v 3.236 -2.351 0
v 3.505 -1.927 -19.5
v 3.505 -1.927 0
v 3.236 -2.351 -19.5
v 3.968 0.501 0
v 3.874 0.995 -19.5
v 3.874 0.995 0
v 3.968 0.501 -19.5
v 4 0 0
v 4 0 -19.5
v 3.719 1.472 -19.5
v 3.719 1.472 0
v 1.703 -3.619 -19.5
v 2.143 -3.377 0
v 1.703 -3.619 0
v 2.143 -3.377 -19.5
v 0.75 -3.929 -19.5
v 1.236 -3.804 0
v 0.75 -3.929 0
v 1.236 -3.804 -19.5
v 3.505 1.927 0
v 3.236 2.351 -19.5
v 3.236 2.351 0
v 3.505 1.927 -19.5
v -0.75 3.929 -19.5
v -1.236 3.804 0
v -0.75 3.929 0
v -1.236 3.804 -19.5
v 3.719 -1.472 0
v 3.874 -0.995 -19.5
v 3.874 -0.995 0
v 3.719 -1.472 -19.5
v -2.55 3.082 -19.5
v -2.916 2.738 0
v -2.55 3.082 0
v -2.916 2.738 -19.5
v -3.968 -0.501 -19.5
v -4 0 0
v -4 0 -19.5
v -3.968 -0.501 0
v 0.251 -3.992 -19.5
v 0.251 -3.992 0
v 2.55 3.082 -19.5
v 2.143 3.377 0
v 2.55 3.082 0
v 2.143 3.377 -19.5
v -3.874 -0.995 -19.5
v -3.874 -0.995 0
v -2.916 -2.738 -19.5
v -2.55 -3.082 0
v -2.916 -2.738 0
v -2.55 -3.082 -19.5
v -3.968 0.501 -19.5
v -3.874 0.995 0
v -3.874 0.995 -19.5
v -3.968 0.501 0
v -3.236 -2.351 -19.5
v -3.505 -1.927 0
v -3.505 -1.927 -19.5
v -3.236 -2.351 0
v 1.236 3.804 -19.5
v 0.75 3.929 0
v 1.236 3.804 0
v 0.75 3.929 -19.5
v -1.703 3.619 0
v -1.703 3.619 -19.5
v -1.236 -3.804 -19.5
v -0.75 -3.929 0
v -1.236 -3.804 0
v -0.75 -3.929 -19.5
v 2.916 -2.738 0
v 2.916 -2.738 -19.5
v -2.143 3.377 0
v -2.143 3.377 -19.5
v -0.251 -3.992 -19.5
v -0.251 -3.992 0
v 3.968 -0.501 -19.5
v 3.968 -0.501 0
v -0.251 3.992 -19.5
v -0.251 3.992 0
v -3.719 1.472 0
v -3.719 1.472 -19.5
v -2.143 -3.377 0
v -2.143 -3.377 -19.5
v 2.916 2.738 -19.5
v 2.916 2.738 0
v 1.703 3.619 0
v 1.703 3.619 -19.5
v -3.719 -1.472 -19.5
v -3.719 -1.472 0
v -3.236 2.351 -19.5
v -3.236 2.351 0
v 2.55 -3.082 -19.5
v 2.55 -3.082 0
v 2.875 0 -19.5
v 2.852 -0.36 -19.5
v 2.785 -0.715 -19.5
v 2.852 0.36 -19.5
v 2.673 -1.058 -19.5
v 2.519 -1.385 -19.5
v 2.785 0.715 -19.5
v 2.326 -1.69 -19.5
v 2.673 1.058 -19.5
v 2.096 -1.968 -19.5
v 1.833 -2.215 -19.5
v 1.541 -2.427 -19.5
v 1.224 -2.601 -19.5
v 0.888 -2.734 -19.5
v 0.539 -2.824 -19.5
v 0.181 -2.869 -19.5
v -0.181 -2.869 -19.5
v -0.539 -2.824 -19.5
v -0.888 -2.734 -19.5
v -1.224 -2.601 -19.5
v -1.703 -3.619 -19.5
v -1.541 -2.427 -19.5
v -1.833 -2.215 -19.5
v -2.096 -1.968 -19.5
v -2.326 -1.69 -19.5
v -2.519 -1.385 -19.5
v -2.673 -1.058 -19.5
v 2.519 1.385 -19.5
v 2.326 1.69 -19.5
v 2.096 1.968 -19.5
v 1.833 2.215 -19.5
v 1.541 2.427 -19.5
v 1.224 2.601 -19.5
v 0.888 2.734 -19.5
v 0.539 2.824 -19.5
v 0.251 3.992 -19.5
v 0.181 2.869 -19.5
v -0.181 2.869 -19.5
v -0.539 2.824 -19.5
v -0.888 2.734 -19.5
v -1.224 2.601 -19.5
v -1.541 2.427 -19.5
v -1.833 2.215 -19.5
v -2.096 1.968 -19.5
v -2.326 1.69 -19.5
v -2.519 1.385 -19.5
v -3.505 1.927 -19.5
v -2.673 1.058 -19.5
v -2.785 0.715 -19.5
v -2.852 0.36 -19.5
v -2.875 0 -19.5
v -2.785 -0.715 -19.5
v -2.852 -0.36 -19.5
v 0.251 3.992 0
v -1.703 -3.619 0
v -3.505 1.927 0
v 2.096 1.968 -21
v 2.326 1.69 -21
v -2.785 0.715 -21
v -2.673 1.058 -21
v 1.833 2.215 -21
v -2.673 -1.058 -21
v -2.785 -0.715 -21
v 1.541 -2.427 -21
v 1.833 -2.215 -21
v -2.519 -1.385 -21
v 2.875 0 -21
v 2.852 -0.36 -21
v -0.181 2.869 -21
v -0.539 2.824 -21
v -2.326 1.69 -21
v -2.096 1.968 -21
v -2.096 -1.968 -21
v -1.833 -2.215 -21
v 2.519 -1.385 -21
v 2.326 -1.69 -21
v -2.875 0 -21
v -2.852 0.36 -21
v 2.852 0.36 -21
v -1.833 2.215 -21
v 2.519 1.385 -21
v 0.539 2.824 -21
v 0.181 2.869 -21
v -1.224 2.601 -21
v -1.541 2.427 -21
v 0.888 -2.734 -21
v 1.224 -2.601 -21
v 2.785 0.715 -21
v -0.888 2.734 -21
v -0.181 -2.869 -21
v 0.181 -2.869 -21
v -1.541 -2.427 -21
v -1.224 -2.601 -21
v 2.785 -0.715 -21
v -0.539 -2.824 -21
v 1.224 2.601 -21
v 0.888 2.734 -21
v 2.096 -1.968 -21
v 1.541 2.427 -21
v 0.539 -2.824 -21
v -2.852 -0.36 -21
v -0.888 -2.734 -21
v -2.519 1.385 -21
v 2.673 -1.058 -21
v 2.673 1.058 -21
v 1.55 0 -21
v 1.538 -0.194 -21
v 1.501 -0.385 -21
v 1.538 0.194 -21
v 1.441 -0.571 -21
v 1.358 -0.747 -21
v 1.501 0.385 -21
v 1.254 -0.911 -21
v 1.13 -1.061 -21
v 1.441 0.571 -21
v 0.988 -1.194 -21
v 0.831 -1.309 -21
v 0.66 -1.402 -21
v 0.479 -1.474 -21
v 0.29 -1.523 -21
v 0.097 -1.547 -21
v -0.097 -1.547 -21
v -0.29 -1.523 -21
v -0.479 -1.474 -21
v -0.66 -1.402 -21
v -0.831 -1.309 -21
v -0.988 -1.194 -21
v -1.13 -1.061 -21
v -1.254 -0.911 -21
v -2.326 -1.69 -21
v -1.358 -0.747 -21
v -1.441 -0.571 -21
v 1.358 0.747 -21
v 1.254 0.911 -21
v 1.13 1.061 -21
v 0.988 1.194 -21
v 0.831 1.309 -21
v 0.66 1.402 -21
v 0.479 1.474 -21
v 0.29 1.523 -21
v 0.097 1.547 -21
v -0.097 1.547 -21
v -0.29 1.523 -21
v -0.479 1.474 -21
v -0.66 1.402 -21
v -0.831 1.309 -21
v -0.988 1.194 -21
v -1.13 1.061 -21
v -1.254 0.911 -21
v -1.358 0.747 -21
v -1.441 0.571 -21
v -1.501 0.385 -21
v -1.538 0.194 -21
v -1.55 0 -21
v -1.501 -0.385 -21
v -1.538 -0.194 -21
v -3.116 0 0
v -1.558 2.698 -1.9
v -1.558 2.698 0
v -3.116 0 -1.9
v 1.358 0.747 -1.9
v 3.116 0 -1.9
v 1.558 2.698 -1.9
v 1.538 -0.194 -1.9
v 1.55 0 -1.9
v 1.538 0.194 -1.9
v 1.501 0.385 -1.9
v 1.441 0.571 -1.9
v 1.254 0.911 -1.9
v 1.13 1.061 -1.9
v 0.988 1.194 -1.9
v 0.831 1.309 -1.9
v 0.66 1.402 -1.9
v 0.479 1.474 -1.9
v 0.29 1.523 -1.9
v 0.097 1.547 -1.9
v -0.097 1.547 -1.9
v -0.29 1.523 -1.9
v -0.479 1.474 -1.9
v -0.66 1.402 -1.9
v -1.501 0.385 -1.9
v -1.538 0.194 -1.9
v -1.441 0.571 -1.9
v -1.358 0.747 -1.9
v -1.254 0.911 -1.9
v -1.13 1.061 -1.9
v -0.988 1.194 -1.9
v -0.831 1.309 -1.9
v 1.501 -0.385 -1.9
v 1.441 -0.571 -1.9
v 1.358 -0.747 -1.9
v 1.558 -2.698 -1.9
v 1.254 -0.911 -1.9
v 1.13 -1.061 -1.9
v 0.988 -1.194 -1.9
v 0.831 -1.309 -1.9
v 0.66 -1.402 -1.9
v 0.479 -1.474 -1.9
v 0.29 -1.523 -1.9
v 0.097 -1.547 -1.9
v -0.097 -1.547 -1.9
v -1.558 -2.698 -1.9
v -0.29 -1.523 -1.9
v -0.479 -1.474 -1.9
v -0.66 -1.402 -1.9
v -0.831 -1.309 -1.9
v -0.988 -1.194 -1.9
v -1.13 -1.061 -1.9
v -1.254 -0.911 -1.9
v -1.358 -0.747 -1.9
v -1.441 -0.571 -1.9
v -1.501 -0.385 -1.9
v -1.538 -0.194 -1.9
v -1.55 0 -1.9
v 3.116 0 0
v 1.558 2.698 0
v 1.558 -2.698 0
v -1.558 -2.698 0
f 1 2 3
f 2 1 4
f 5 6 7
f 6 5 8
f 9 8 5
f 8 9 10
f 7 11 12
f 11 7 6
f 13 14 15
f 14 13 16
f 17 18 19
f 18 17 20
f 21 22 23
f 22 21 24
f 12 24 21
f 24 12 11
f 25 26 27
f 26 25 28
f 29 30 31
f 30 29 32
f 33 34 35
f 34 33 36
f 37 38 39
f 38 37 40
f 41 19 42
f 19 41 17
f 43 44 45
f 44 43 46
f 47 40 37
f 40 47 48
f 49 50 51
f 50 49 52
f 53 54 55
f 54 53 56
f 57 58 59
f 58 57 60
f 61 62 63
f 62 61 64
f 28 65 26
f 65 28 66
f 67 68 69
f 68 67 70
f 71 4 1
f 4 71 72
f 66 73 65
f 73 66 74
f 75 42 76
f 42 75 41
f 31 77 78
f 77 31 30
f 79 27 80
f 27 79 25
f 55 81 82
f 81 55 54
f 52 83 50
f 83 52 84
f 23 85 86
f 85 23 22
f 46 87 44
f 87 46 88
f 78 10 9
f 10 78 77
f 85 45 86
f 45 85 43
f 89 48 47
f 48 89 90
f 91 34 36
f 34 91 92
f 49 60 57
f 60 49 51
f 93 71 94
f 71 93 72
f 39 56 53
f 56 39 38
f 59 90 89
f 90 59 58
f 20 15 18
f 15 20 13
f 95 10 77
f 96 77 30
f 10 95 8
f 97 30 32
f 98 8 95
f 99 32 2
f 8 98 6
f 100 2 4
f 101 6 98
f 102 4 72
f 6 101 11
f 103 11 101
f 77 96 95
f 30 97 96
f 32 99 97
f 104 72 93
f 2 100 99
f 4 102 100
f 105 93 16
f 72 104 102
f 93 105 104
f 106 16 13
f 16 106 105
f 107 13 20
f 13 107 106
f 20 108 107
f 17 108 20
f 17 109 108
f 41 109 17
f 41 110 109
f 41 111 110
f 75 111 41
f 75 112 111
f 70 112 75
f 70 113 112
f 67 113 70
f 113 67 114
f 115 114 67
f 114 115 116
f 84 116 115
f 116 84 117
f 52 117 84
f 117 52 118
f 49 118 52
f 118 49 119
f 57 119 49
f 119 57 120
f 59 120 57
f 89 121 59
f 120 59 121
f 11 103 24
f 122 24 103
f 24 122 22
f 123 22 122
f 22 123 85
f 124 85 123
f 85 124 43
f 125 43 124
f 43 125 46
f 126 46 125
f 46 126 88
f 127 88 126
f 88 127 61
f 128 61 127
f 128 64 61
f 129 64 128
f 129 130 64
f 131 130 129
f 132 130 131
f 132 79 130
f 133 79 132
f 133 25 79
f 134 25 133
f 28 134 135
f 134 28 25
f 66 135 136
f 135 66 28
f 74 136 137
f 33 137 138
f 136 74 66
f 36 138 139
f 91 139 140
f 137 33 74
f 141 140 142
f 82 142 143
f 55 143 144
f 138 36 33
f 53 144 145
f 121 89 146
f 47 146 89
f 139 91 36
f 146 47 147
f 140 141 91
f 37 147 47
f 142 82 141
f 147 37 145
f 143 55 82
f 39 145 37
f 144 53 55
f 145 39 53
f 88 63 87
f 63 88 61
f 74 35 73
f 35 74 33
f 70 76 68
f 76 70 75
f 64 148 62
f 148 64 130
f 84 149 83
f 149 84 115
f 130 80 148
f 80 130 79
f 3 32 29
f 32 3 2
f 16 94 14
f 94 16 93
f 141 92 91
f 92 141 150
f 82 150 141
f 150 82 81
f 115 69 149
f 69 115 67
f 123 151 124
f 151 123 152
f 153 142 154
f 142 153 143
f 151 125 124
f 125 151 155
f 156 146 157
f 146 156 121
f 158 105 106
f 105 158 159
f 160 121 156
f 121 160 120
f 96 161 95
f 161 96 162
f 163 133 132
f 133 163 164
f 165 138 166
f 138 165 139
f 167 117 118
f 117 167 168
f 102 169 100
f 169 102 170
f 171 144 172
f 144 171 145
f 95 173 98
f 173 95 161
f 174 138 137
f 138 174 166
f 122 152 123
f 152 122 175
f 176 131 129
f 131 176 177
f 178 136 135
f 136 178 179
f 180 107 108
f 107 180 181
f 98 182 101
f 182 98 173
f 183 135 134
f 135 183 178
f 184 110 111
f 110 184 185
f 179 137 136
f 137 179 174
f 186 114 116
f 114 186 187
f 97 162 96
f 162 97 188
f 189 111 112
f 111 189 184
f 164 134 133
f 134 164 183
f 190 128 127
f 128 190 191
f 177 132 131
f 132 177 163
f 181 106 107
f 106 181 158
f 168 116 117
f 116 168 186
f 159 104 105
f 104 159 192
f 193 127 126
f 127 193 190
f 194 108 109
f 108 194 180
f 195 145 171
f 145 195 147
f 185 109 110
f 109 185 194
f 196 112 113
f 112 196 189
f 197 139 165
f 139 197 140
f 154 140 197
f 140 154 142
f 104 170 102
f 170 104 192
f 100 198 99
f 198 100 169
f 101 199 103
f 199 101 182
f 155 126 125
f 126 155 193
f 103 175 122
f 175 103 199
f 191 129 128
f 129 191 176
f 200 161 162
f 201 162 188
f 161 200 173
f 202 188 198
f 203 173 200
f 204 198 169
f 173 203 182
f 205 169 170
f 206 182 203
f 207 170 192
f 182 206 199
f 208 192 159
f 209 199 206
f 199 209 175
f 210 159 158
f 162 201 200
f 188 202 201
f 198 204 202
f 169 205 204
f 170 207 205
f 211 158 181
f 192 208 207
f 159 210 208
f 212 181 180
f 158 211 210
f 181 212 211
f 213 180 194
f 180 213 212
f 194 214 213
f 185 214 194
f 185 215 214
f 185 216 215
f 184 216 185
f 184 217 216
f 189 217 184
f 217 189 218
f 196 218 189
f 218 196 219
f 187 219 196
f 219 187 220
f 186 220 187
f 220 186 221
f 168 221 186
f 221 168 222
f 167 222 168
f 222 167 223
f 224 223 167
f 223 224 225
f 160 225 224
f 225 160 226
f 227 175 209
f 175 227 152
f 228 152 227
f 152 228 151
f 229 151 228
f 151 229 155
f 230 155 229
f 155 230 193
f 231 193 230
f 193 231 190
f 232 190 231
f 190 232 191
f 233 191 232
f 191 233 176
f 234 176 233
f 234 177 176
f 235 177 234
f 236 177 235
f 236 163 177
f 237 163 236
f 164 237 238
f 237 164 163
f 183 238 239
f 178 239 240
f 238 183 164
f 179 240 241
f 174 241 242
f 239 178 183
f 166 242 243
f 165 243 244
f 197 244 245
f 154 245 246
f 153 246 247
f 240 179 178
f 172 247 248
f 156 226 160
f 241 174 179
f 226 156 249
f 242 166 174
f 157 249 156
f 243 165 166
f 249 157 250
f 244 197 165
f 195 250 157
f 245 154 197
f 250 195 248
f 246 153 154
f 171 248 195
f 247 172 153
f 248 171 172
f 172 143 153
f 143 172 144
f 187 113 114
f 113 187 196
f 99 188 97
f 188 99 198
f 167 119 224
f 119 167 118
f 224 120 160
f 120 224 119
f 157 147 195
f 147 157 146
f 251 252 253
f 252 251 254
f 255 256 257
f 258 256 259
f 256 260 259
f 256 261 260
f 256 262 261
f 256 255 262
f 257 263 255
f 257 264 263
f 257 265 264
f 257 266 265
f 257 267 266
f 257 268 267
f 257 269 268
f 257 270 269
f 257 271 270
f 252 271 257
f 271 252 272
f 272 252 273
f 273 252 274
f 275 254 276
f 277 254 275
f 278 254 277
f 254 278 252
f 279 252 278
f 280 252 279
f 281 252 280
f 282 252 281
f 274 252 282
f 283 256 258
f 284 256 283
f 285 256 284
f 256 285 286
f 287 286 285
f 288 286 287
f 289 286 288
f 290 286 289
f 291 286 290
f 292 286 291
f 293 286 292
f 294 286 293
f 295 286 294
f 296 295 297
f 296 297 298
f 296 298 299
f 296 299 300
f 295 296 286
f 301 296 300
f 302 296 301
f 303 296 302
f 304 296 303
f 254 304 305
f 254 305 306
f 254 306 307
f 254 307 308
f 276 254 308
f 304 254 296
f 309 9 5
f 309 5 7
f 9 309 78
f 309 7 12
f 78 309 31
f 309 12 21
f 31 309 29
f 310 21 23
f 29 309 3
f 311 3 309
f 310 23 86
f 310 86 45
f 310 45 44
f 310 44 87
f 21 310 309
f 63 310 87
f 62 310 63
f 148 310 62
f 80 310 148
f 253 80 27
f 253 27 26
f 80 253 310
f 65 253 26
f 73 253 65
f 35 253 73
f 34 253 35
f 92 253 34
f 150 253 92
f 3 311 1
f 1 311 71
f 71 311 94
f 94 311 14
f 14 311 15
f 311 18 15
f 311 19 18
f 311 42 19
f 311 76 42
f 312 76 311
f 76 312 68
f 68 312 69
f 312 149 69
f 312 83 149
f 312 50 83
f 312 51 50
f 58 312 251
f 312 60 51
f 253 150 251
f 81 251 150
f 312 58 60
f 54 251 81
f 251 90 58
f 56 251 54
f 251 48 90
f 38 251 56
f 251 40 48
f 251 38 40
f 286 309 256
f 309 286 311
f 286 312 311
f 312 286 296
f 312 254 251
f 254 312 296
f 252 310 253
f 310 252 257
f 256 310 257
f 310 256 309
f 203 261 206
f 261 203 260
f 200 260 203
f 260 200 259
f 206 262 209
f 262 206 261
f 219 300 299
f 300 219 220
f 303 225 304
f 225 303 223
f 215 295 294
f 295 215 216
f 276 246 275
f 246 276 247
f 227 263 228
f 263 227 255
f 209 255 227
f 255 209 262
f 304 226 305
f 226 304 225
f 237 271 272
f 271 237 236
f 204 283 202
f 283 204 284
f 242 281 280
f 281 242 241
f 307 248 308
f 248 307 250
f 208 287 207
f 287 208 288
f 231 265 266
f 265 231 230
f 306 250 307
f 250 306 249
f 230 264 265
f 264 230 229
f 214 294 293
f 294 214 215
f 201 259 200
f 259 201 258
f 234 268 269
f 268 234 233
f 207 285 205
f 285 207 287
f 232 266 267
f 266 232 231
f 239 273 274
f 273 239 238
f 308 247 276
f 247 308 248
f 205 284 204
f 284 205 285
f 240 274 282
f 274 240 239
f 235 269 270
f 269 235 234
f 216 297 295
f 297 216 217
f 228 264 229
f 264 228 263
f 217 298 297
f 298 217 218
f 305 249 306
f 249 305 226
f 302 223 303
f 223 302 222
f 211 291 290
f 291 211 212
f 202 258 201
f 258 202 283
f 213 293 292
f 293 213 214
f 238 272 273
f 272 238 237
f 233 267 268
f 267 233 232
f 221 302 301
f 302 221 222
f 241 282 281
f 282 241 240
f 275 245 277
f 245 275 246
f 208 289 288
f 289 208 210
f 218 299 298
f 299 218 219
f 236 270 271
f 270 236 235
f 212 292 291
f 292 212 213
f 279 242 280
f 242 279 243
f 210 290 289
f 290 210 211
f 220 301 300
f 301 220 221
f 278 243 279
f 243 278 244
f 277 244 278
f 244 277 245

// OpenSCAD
$fn = 50;

difference() {
	union() {
		translate(v = [0, 0, -19.5]) {
			cylinder(h = 22.5, r = 4.0);
		}
		#translate(v = [0, 0, -21.0]) {
			cylinder(h = 21, r = 2.875);
		}
	}
	union() {
		translate(v = [0, 0, 0]) {
			rotate(a = [0, 0, 0]) {
				difference() {
					union() {
						translate(v = [0, 0, -1.9]) {
							linear_extrude(height = 1.9) {
								polygon(points = [[3.1158, 0.0], [1.5579000000000005, 2.698361953111554], [-1.5578999999999994, 2.6983619531115544], [-3.1158, 3.815754496783323e-16], [-1.5579000000000014, -2.6983619531115535], [1.557899999999998, -2.6983619531115552]]);
							}
						}
					}
					union();
				}
			}
		}
		#cylinder(h = 3, r = 5.0);
		#translate(v = [0, 0, -100.0]) {
			cylinder(h = 200, r = 1.55);
		}
	}
}
